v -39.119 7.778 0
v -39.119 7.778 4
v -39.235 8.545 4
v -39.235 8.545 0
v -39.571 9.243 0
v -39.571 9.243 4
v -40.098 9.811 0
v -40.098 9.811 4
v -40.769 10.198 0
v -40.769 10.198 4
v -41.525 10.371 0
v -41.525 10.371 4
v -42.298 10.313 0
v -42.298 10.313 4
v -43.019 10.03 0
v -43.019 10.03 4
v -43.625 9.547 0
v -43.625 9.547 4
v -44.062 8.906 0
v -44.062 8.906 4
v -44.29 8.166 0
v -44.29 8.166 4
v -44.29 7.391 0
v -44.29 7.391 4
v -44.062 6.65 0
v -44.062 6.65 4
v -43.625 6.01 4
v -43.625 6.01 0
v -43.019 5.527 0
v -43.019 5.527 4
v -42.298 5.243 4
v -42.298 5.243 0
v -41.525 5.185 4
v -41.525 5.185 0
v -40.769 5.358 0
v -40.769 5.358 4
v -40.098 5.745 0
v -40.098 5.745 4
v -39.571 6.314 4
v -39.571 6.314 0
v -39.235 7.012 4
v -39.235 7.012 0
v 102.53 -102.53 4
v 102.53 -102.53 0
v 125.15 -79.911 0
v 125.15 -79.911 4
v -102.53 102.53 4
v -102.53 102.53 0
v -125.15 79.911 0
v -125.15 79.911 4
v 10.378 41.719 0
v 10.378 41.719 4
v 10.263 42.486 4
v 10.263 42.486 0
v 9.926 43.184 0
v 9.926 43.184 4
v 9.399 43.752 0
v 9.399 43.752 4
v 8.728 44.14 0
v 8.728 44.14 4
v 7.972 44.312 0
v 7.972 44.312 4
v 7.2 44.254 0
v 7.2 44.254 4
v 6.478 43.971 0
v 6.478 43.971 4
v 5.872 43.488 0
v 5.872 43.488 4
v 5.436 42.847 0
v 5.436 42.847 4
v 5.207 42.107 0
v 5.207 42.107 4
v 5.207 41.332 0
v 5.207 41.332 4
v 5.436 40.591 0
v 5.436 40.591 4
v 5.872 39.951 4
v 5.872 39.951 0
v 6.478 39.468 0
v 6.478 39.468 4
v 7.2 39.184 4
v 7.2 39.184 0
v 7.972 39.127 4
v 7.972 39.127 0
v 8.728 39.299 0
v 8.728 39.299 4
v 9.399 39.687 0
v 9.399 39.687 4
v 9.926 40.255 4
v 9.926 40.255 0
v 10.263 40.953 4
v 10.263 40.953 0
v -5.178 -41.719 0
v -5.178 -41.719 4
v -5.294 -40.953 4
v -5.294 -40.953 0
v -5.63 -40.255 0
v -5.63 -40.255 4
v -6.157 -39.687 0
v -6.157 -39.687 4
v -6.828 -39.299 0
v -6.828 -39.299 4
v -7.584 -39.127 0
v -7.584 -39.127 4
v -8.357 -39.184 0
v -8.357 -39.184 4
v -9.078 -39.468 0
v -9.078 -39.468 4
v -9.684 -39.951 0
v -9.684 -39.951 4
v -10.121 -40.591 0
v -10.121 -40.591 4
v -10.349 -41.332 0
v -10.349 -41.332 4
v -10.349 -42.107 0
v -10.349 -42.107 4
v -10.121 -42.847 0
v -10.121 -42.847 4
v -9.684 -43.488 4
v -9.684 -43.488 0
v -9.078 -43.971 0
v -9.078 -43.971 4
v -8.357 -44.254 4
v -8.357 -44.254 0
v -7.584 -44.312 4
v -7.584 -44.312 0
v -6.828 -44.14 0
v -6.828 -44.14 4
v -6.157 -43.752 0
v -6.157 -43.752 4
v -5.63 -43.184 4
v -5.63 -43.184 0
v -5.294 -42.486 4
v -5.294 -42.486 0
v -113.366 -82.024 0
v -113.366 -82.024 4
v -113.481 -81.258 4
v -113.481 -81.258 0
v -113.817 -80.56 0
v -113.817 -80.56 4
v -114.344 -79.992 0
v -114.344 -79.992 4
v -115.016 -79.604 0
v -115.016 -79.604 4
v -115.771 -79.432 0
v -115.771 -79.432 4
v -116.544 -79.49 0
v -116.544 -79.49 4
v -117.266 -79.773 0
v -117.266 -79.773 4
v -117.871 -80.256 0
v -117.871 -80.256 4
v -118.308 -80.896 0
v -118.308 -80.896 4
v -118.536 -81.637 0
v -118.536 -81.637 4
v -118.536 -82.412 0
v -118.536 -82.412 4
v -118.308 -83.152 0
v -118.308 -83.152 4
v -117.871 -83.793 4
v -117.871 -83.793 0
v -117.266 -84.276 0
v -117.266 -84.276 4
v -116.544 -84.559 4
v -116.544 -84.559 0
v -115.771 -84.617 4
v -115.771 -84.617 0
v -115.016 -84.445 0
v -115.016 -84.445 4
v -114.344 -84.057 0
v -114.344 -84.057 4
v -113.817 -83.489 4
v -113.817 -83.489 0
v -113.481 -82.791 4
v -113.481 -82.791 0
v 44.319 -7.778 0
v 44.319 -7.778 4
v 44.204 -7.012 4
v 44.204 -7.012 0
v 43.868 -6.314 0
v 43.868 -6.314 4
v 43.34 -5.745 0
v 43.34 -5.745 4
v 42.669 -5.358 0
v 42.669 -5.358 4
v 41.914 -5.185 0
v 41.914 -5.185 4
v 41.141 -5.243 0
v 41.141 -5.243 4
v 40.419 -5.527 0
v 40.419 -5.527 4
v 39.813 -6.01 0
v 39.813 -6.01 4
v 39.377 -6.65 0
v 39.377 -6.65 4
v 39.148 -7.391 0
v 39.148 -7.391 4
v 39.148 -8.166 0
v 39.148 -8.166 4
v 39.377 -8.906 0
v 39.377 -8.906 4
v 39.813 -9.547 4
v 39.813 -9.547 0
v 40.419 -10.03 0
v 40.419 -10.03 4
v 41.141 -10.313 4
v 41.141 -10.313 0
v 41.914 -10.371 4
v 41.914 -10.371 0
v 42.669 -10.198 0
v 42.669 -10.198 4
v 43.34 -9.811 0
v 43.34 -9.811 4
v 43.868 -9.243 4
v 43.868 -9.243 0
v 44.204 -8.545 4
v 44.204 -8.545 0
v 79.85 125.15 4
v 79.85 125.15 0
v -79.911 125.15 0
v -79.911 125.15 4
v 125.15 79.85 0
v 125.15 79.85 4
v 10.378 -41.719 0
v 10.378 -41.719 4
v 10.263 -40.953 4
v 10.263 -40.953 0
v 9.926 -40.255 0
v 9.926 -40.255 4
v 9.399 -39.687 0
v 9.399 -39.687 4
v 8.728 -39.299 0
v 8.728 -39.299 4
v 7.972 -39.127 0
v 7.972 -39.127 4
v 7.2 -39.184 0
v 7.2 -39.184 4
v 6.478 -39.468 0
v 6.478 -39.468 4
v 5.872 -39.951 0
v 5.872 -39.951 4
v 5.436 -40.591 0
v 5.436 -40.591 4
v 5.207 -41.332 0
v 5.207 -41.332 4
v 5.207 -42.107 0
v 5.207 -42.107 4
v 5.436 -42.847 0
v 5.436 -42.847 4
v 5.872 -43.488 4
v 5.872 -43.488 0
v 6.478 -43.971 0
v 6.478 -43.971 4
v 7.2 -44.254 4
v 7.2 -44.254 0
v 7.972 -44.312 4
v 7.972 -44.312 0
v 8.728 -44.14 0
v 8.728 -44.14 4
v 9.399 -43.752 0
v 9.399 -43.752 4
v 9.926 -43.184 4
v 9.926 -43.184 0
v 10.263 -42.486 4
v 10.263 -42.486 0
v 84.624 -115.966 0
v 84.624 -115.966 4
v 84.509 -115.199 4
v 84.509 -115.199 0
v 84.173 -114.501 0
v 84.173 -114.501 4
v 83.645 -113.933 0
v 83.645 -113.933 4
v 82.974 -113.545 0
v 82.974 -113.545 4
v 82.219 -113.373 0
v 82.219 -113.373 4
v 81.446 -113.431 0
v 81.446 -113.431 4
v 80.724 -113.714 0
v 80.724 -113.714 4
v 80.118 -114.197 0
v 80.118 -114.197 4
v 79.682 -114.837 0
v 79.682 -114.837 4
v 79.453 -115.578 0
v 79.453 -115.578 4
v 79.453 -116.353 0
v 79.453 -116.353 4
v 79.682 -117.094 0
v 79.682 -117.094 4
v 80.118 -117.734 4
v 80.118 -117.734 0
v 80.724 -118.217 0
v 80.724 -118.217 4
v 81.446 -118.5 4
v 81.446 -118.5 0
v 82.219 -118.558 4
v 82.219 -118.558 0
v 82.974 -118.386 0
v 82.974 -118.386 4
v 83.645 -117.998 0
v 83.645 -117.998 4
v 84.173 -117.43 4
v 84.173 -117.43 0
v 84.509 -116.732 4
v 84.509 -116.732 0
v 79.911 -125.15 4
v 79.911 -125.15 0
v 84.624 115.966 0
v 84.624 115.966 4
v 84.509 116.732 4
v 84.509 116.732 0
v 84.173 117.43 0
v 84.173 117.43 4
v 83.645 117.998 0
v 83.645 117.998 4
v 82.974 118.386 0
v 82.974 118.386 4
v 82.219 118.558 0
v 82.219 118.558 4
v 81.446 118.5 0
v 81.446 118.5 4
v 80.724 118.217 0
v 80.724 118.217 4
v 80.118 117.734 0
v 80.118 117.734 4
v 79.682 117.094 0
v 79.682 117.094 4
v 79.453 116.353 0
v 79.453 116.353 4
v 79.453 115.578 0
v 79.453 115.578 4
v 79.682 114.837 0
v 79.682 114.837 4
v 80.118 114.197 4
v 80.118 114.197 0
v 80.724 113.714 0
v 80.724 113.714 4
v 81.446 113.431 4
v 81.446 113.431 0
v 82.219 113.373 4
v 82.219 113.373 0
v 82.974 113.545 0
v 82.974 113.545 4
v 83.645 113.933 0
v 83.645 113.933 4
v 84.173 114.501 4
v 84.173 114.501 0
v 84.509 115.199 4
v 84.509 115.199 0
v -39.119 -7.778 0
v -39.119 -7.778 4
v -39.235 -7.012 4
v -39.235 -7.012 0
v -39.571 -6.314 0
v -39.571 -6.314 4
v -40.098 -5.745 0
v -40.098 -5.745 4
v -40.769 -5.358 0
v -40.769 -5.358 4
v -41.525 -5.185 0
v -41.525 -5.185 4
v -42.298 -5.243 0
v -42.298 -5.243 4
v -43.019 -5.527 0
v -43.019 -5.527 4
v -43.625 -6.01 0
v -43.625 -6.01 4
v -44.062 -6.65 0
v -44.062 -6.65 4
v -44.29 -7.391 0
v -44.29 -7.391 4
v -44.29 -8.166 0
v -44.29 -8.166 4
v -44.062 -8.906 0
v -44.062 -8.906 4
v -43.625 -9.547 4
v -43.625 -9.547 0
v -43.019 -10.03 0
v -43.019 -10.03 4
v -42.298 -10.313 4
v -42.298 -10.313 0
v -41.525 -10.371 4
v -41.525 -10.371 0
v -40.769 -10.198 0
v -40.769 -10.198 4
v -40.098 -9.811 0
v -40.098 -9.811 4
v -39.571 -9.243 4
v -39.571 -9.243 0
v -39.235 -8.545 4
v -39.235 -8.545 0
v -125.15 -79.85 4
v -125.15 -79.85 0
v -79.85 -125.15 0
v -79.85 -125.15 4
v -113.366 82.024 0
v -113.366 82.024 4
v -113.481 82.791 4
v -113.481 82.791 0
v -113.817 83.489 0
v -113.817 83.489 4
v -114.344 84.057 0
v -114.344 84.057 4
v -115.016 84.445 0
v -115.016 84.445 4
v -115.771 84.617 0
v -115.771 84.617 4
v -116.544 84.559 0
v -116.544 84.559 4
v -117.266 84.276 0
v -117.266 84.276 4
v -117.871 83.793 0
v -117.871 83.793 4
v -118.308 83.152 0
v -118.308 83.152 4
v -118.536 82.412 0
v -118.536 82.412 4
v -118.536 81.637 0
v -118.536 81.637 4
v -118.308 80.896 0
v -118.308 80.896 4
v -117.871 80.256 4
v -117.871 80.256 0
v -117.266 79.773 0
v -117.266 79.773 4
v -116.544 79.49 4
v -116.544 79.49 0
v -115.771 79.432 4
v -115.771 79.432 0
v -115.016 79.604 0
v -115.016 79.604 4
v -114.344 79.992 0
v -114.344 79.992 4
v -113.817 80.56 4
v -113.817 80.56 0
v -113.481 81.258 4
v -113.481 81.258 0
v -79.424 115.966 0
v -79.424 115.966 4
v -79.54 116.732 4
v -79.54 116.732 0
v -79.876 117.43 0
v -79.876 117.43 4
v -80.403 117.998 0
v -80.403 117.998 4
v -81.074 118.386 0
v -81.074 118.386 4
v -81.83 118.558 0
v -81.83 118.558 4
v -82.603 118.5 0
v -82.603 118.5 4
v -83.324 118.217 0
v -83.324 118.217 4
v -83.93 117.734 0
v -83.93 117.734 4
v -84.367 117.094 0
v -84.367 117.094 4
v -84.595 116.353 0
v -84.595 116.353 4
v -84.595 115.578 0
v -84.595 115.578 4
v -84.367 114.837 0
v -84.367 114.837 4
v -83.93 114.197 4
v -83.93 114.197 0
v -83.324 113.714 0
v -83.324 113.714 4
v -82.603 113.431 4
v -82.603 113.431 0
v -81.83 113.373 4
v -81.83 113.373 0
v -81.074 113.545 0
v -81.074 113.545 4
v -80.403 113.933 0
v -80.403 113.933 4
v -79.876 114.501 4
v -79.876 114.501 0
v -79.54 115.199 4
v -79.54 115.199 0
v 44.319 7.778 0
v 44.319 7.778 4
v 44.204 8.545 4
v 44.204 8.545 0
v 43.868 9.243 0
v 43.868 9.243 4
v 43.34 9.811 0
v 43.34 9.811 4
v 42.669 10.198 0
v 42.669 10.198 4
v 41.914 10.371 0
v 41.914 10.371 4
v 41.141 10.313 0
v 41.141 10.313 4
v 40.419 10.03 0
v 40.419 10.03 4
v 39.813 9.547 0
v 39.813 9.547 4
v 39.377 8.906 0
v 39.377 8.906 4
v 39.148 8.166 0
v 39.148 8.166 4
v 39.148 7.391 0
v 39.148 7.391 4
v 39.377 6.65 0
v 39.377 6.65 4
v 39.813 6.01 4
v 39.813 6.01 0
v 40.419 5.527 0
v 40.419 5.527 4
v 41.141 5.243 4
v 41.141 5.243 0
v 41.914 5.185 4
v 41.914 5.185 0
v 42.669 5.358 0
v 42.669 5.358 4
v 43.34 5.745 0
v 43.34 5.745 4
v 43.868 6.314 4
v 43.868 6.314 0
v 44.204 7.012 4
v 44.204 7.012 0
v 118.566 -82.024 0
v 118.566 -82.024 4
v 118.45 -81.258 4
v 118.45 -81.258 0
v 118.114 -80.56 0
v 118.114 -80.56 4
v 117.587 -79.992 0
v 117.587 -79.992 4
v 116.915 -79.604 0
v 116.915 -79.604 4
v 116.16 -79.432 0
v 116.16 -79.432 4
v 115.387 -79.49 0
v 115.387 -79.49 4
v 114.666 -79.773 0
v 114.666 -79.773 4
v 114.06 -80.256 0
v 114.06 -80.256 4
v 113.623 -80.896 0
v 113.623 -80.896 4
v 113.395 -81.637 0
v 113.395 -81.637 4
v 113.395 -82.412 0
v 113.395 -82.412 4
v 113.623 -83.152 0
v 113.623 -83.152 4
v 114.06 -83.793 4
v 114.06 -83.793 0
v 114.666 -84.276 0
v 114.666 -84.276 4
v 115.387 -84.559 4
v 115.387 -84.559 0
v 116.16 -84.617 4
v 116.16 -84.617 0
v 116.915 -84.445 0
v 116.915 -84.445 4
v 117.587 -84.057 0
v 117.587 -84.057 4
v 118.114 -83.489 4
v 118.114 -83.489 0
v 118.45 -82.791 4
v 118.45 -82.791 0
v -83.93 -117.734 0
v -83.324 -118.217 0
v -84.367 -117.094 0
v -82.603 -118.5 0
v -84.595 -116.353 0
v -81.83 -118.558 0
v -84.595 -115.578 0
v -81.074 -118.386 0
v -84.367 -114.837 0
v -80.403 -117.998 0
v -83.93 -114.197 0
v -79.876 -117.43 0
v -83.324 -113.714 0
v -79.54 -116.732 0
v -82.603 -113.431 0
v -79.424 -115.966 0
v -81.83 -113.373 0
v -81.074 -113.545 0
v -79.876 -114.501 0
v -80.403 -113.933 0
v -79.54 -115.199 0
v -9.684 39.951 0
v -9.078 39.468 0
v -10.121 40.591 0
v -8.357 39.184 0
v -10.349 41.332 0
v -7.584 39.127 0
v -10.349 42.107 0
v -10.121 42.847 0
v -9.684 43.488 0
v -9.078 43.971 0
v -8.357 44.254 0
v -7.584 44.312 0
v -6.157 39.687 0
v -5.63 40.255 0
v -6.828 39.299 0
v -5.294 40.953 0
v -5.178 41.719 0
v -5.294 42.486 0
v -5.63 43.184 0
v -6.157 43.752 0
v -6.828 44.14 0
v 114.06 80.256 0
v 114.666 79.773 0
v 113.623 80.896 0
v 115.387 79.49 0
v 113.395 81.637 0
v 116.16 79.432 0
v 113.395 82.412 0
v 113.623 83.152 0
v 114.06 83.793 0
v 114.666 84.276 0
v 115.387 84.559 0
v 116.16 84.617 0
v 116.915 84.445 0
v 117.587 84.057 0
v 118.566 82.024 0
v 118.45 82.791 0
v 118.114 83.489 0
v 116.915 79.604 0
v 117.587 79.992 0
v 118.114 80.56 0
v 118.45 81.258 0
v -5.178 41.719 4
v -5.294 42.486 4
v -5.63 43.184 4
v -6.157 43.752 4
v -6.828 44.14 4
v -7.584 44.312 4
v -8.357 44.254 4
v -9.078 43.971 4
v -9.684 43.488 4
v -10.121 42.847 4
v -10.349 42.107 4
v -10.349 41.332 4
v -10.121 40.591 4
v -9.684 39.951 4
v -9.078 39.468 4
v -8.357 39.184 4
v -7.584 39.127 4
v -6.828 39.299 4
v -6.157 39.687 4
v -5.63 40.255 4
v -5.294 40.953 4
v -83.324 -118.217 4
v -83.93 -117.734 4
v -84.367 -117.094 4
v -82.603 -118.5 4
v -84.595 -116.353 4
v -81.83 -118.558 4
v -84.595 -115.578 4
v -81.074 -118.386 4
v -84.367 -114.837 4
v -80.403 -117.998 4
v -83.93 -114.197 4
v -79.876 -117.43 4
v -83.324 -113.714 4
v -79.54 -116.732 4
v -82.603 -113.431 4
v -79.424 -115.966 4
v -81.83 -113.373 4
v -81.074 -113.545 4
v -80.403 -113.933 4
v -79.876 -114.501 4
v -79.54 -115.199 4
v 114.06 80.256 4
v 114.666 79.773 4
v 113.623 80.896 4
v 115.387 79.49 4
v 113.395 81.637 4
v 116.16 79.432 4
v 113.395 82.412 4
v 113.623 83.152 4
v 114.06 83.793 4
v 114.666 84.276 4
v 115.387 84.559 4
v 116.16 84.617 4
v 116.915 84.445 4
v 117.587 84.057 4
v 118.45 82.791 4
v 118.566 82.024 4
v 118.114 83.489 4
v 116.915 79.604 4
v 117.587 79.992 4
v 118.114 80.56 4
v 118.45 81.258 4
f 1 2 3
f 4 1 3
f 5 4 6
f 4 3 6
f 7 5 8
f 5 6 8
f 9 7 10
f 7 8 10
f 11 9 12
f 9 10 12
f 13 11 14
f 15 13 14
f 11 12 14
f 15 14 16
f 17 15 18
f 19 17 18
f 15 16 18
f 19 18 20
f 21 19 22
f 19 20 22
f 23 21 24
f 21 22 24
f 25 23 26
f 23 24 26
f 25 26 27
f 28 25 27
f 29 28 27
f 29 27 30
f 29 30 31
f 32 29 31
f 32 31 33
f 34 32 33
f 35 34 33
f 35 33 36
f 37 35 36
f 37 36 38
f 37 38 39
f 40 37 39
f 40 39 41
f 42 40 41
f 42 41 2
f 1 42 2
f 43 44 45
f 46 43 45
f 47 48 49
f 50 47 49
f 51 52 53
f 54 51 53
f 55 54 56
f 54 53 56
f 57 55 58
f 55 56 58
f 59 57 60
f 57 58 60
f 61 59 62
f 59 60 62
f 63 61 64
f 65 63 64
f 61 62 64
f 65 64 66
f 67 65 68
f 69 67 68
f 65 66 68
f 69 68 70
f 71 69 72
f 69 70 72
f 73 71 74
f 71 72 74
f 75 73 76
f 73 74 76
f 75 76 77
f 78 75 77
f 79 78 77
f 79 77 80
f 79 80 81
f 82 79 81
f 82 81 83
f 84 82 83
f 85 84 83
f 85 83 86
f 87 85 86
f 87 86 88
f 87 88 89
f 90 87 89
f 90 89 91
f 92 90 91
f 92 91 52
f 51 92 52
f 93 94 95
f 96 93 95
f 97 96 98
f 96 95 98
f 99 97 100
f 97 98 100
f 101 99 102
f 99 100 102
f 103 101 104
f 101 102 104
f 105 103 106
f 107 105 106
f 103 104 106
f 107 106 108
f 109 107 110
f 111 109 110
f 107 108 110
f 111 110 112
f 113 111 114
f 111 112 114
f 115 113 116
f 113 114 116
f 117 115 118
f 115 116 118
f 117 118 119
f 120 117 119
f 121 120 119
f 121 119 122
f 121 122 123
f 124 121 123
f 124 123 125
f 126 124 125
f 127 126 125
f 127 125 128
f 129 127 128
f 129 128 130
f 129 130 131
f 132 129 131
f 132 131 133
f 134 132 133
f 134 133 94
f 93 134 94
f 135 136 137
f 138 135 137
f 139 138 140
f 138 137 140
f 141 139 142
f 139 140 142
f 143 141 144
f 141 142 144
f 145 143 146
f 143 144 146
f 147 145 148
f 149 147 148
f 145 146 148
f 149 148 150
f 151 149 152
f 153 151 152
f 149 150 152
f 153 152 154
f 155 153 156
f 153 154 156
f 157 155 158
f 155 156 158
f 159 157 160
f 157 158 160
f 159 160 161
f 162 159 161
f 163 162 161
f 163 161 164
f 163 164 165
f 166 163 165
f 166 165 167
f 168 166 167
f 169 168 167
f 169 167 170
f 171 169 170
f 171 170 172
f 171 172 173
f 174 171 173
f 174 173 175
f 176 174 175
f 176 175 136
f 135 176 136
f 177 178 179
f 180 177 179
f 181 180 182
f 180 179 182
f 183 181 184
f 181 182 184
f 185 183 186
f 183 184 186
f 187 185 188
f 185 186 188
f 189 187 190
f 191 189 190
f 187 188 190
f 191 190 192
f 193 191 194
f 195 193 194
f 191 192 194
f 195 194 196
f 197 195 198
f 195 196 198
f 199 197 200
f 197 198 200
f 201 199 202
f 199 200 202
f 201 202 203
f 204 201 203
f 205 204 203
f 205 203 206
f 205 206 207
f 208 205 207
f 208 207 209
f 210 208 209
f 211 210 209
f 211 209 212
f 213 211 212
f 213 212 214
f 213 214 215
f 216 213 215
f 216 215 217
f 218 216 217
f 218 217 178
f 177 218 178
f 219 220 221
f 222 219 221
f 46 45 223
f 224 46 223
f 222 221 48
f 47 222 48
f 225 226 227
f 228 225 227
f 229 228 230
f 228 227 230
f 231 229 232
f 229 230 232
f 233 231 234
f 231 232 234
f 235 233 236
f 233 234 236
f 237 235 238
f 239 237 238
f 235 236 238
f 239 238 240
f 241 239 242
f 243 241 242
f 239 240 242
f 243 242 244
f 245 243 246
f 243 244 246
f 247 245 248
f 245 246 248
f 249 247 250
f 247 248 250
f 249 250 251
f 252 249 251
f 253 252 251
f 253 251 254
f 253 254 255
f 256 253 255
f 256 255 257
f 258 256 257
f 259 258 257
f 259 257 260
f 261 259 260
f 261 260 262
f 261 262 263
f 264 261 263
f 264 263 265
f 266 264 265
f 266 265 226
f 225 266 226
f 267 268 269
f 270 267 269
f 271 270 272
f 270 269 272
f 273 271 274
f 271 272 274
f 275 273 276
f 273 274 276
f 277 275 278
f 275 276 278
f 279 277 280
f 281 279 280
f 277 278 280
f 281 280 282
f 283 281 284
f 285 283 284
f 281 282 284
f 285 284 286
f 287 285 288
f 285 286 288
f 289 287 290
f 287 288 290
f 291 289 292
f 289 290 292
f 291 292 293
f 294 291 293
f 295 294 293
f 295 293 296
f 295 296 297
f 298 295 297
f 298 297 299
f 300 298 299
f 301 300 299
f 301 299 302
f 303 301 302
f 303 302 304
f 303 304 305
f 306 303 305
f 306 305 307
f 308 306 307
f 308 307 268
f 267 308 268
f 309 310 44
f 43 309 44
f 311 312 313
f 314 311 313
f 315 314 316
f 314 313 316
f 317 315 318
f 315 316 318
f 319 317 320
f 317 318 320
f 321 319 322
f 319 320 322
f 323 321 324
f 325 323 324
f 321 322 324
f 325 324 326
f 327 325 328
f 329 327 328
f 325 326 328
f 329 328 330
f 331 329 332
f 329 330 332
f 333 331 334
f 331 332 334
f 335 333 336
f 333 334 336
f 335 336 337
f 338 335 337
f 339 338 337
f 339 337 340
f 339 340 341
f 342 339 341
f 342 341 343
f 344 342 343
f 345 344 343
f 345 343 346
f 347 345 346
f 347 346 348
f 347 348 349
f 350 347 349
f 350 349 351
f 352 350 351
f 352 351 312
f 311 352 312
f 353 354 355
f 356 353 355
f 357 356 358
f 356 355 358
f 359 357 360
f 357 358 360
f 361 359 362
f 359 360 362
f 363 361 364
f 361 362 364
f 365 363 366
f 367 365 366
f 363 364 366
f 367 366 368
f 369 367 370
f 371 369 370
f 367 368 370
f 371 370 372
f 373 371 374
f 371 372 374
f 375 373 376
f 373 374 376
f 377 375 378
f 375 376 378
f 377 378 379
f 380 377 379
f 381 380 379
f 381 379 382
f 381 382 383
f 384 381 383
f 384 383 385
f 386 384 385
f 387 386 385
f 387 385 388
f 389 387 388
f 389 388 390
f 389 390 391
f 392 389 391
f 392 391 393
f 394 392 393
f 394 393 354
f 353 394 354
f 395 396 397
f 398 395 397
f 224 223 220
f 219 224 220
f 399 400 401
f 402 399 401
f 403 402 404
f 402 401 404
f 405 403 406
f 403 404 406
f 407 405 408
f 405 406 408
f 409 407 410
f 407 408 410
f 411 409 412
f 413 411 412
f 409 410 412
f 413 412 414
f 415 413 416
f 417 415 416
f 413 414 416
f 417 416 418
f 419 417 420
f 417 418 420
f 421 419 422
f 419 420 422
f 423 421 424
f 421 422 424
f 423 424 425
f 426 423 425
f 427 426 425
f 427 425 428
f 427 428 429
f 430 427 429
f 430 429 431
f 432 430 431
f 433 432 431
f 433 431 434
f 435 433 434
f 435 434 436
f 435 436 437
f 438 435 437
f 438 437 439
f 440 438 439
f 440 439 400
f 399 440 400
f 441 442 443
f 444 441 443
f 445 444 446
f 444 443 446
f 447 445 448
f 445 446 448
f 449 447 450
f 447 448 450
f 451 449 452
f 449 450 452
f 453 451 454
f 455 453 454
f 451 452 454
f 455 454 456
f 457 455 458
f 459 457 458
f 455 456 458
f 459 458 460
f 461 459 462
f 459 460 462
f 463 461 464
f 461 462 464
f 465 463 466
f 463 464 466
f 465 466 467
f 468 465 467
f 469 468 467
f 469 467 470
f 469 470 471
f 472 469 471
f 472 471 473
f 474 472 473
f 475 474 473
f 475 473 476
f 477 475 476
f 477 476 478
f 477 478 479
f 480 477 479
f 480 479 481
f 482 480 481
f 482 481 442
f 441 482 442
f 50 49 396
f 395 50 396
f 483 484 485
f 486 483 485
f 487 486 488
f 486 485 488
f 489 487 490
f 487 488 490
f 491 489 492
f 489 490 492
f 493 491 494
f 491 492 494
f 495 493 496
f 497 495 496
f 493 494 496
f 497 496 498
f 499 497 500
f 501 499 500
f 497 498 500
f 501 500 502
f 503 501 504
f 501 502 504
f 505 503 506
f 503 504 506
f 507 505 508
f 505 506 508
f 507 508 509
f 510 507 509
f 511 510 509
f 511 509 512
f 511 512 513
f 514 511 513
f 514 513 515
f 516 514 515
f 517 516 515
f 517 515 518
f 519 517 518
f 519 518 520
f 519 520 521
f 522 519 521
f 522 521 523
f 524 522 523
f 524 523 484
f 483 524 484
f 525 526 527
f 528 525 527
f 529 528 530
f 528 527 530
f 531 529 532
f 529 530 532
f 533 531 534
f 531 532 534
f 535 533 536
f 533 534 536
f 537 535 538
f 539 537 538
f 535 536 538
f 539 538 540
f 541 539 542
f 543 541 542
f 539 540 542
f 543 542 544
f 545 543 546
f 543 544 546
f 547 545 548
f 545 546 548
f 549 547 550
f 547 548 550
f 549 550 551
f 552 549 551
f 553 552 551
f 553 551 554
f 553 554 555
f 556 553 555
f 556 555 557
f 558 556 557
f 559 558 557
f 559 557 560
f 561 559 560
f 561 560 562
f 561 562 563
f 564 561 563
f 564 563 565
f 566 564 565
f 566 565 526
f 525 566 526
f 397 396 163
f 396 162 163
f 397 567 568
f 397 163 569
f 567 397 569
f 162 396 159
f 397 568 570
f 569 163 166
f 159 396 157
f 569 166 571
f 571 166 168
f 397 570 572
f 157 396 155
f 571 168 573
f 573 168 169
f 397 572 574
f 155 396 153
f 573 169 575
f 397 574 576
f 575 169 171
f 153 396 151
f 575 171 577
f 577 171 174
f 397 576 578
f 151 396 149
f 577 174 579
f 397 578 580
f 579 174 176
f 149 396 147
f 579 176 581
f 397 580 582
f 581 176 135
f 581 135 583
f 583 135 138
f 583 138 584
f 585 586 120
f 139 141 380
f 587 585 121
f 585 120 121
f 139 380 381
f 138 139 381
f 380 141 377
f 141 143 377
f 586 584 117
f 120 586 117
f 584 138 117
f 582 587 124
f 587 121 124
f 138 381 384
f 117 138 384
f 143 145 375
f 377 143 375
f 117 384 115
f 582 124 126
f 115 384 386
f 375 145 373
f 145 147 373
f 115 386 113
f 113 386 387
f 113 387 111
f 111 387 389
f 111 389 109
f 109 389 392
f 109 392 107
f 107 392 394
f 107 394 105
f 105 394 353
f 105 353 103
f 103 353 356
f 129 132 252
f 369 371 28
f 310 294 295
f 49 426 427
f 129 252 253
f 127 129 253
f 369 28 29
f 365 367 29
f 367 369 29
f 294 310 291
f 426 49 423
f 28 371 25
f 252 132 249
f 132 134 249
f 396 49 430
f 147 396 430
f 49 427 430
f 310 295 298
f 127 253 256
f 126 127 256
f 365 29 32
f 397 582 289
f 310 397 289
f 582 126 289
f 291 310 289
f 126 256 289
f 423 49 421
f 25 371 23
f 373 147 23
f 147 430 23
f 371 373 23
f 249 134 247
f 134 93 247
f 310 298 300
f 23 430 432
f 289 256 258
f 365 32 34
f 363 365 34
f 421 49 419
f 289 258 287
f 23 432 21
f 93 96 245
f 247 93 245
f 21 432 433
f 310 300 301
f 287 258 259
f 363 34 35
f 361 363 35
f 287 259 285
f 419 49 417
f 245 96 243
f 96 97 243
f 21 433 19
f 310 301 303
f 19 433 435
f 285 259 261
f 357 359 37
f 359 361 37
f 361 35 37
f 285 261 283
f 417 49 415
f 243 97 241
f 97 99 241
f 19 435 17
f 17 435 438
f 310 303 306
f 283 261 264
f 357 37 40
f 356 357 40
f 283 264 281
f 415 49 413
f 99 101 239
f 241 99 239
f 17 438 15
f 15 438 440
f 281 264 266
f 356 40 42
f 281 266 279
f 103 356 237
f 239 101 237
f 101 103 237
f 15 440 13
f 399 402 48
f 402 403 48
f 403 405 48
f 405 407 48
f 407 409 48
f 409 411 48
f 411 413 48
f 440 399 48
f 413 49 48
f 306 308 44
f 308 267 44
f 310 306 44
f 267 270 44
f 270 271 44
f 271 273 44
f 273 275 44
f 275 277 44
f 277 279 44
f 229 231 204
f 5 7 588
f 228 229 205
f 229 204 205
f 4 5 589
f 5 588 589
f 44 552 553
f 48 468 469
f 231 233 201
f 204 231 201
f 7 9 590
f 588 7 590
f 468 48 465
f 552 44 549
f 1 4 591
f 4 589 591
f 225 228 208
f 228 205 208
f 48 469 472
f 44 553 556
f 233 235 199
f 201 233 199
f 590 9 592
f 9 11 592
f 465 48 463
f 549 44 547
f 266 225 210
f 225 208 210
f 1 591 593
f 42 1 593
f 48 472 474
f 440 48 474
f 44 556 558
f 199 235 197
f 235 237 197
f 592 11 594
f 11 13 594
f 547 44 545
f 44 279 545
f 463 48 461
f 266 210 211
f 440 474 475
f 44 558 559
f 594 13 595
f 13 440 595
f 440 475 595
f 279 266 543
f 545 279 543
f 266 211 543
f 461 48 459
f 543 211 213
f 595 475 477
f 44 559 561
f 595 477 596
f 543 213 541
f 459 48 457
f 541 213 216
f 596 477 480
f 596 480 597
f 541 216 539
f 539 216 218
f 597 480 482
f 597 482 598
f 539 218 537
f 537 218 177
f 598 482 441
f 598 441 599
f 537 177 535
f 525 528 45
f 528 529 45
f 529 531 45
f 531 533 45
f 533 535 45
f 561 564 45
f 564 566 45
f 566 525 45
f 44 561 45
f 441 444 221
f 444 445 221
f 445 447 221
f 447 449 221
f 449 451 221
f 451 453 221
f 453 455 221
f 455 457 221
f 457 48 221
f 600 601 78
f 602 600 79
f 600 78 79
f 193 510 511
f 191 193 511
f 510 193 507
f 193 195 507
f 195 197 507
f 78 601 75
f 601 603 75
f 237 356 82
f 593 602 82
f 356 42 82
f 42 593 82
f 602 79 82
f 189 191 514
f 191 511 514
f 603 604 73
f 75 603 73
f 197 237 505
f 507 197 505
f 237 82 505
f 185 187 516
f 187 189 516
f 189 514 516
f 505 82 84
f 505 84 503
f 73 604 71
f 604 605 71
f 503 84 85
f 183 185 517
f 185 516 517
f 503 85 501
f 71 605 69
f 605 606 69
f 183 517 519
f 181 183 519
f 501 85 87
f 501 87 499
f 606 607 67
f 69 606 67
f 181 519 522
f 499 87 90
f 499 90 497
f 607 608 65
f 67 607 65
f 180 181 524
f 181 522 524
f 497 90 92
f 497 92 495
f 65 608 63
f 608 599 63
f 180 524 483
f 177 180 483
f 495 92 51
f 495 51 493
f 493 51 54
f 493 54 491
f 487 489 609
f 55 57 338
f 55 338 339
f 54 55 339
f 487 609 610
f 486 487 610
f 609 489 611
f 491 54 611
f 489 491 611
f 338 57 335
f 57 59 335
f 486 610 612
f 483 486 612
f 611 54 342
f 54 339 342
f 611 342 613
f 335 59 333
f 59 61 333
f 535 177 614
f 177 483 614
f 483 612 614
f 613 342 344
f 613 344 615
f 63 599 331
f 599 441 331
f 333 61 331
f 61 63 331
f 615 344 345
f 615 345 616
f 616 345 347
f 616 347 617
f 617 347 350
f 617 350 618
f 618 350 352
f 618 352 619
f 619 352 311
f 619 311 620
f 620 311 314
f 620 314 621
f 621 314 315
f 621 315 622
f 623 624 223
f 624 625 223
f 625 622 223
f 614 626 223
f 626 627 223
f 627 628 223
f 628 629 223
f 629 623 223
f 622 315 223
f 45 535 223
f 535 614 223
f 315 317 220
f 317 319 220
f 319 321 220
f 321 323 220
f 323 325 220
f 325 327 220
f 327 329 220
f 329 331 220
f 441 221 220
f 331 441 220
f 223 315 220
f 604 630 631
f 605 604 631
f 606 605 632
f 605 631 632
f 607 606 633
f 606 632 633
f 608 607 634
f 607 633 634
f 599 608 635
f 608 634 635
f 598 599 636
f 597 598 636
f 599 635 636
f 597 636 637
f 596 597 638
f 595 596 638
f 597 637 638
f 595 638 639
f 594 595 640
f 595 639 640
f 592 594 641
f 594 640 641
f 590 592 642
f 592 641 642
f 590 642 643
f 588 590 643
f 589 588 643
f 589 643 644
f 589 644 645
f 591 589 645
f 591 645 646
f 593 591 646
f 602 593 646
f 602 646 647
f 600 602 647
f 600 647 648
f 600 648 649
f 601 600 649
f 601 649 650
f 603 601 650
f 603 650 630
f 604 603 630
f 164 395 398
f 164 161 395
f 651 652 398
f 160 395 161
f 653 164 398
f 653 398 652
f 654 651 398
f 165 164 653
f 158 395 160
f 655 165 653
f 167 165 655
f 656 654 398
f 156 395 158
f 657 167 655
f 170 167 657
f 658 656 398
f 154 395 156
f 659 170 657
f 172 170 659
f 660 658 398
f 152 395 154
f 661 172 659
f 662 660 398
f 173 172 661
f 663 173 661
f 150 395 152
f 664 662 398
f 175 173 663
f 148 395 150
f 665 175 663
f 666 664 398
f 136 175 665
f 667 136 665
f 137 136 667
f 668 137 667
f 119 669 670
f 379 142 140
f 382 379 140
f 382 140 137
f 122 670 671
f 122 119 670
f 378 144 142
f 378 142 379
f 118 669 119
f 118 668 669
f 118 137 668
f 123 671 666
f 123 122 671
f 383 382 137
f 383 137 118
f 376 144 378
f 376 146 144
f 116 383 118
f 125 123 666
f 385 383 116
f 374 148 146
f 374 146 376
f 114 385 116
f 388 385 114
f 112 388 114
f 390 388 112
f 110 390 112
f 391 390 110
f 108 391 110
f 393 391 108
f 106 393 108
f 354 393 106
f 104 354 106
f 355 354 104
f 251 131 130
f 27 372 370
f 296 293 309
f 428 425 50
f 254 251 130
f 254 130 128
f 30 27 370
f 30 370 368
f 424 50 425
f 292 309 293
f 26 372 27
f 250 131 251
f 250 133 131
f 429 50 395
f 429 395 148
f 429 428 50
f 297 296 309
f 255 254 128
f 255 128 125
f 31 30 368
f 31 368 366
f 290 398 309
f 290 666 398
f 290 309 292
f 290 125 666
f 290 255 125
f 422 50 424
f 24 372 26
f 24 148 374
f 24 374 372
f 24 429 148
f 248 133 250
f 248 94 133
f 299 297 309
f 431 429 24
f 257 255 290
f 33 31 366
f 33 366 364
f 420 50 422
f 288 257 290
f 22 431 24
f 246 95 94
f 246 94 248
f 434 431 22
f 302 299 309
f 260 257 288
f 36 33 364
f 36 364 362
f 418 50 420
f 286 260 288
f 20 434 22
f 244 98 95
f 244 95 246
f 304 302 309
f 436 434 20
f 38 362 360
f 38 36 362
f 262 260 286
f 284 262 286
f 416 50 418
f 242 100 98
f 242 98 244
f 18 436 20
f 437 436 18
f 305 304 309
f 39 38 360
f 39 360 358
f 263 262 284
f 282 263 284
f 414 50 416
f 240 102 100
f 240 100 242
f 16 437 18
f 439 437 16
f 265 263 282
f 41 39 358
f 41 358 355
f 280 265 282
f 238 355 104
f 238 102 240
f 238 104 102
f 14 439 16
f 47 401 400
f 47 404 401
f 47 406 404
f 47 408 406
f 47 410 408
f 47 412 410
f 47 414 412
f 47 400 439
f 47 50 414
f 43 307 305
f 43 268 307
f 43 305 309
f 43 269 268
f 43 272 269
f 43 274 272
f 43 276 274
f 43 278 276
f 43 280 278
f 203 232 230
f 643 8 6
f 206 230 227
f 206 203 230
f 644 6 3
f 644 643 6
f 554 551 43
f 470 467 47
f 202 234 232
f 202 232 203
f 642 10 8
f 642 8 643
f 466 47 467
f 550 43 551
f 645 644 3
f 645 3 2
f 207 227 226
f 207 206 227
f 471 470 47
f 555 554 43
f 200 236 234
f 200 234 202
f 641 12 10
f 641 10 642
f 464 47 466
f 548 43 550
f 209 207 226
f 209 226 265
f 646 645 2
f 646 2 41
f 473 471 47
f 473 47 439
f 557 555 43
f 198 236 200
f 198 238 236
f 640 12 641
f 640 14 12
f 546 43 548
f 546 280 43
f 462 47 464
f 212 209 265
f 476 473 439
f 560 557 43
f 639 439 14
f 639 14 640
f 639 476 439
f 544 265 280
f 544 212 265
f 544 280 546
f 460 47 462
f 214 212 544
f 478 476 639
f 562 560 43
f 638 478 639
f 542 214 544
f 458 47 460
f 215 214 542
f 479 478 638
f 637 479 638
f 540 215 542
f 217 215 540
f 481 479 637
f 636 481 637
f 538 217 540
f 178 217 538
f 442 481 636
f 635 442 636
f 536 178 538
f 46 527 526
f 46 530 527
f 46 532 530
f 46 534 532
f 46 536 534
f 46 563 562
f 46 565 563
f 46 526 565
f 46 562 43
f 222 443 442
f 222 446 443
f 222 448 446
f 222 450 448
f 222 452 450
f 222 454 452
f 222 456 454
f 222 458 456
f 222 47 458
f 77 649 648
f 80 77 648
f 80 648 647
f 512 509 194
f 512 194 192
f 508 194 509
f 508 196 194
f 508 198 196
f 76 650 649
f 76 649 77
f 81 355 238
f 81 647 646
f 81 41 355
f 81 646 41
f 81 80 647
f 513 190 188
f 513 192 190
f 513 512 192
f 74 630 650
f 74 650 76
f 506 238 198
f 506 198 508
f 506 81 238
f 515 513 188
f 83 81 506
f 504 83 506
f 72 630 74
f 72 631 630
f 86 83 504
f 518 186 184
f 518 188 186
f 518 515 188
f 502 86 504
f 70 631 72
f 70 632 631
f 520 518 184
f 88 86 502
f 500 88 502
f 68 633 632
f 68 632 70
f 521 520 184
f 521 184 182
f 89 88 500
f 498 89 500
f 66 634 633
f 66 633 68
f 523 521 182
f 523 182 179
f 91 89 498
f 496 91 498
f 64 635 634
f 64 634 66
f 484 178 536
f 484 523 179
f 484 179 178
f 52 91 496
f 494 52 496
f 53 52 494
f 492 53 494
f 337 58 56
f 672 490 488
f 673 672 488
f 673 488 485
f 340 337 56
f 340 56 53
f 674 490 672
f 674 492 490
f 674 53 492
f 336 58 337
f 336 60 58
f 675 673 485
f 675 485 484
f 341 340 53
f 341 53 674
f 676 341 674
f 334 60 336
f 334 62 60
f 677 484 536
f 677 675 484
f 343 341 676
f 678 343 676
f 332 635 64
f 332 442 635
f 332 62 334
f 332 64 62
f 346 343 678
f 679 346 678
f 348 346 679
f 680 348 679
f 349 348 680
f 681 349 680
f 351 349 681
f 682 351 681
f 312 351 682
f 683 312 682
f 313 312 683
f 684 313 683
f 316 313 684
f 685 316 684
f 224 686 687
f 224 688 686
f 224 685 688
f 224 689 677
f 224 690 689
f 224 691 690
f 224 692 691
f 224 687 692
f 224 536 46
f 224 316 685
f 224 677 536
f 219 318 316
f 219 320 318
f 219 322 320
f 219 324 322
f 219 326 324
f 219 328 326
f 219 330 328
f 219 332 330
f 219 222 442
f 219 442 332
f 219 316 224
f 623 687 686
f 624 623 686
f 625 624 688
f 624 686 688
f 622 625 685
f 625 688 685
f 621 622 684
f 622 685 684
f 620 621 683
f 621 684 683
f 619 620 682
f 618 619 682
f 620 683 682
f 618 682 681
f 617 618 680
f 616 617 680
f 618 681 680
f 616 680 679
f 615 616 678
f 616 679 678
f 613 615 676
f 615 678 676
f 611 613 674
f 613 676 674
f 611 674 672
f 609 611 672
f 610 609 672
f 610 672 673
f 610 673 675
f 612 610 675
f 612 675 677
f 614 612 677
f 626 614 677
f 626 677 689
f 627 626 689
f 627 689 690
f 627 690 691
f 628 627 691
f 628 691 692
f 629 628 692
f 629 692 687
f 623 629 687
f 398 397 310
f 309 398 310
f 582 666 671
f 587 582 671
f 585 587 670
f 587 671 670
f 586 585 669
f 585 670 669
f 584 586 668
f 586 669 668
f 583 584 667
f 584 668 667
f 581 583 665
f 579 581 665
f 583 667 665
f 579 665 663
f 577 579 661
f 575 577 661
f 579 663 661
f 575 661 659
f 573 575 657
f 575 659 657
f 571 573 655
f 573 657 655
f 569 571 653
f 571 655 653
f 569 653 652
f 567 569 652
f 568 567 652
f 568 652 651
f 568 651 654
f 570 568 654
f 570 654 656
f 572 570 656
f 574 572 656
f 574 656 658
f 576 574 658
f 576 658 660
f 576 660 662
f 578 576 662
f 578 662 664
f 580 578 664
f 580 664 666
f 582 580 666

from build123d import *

# Parameters (mm, degrees)
F1_DEPTH = 4
F2_R     = 2.6
F3_DEPTH = 20
F4_R     = 2.6
F5_DEPTH = 4.001


# Not quite as in the source:
# - a feature names something its author has since deleted; it is built from what else it names


with BuildPart() as f1:
    # F0 (on Top) → F1 (new body)
    with BuildSketch(Plane.XY):
        Polygon((125.15, 79.85), (102.5, 102.5), (79.85, 125.15), (-79.9109665441, 125.15), (-102.530483272, 102.530483272), (-125.15, 79.9109665441), (-125.15, -79.85), (-102.5, -102.5), (-79.85, -125.15), (79.9109665441, -125.15), (102.530483272, -102.530483272), (125.15, -79.9109665441), align=None)
    extrude(amount=F1_DEPTH)

    # F2 (on face) → F3 (cut)
    with BuildSketch(Plane.XY.offset(4)):
        with Locations((-7.7781745931, 41.71930009)):
            Circle(F2_R)
        with Locations((-41.71930009, 7.7781745931)):
            Circle(F2_R)
        with Locations((7.7781745931, -41.71930009)):
            Circle(F2_R)
        with Locations((41.71930009, -7.7781745931)):
            Circle(F2_R)
        with Locations((41.71930009, 7.7781745931)):
            Circle(F2_R)
        with Locations((7.7781745931, 41.71930009)):
            Circle(F2_R)
        with Locations((-41.71930009, -7.7781745931)):
            Circle(F2_R)
        with Locations((-7.7781745931, -41.71930009)):
            Circle(F2_R)
    extrude(amount=-F3_DEPTH, mode=Mode.SUBTRACT)

    # F4 (on face) → F5 (cut, through all)
    with BuildSketch(Plane.XY.offset(4)):
        with Locations((-82.0243866176, 115.9655121146)):
            Circle(F4_R)
        with Locations((-115.9655121146, 82.0243866176)):
            Circle(F4_R)
        with Locations((82.0243866176, -115.9655121146)):
            Circle(F4_R)
        with Locations((115.9655121146, -82.0243866176)):
            Circle(F4_R)
        with Locations((82.0243866176, 115.9655121146)):
            Circle(F4_R)
        with Locations((115.9655121146, 82.0243866176)):
            Circle(F4_R)
        with Locations((-115.9655121146, -82.0243866176)):
            Circle(F4_R)
        with Locations((-82.0243866176, -115.9655121146)):
            Circle(F4_R)
    extrude(amount=-F5_DEPTH, mode=Mode.SUBTRACT)


solid = f1.part
